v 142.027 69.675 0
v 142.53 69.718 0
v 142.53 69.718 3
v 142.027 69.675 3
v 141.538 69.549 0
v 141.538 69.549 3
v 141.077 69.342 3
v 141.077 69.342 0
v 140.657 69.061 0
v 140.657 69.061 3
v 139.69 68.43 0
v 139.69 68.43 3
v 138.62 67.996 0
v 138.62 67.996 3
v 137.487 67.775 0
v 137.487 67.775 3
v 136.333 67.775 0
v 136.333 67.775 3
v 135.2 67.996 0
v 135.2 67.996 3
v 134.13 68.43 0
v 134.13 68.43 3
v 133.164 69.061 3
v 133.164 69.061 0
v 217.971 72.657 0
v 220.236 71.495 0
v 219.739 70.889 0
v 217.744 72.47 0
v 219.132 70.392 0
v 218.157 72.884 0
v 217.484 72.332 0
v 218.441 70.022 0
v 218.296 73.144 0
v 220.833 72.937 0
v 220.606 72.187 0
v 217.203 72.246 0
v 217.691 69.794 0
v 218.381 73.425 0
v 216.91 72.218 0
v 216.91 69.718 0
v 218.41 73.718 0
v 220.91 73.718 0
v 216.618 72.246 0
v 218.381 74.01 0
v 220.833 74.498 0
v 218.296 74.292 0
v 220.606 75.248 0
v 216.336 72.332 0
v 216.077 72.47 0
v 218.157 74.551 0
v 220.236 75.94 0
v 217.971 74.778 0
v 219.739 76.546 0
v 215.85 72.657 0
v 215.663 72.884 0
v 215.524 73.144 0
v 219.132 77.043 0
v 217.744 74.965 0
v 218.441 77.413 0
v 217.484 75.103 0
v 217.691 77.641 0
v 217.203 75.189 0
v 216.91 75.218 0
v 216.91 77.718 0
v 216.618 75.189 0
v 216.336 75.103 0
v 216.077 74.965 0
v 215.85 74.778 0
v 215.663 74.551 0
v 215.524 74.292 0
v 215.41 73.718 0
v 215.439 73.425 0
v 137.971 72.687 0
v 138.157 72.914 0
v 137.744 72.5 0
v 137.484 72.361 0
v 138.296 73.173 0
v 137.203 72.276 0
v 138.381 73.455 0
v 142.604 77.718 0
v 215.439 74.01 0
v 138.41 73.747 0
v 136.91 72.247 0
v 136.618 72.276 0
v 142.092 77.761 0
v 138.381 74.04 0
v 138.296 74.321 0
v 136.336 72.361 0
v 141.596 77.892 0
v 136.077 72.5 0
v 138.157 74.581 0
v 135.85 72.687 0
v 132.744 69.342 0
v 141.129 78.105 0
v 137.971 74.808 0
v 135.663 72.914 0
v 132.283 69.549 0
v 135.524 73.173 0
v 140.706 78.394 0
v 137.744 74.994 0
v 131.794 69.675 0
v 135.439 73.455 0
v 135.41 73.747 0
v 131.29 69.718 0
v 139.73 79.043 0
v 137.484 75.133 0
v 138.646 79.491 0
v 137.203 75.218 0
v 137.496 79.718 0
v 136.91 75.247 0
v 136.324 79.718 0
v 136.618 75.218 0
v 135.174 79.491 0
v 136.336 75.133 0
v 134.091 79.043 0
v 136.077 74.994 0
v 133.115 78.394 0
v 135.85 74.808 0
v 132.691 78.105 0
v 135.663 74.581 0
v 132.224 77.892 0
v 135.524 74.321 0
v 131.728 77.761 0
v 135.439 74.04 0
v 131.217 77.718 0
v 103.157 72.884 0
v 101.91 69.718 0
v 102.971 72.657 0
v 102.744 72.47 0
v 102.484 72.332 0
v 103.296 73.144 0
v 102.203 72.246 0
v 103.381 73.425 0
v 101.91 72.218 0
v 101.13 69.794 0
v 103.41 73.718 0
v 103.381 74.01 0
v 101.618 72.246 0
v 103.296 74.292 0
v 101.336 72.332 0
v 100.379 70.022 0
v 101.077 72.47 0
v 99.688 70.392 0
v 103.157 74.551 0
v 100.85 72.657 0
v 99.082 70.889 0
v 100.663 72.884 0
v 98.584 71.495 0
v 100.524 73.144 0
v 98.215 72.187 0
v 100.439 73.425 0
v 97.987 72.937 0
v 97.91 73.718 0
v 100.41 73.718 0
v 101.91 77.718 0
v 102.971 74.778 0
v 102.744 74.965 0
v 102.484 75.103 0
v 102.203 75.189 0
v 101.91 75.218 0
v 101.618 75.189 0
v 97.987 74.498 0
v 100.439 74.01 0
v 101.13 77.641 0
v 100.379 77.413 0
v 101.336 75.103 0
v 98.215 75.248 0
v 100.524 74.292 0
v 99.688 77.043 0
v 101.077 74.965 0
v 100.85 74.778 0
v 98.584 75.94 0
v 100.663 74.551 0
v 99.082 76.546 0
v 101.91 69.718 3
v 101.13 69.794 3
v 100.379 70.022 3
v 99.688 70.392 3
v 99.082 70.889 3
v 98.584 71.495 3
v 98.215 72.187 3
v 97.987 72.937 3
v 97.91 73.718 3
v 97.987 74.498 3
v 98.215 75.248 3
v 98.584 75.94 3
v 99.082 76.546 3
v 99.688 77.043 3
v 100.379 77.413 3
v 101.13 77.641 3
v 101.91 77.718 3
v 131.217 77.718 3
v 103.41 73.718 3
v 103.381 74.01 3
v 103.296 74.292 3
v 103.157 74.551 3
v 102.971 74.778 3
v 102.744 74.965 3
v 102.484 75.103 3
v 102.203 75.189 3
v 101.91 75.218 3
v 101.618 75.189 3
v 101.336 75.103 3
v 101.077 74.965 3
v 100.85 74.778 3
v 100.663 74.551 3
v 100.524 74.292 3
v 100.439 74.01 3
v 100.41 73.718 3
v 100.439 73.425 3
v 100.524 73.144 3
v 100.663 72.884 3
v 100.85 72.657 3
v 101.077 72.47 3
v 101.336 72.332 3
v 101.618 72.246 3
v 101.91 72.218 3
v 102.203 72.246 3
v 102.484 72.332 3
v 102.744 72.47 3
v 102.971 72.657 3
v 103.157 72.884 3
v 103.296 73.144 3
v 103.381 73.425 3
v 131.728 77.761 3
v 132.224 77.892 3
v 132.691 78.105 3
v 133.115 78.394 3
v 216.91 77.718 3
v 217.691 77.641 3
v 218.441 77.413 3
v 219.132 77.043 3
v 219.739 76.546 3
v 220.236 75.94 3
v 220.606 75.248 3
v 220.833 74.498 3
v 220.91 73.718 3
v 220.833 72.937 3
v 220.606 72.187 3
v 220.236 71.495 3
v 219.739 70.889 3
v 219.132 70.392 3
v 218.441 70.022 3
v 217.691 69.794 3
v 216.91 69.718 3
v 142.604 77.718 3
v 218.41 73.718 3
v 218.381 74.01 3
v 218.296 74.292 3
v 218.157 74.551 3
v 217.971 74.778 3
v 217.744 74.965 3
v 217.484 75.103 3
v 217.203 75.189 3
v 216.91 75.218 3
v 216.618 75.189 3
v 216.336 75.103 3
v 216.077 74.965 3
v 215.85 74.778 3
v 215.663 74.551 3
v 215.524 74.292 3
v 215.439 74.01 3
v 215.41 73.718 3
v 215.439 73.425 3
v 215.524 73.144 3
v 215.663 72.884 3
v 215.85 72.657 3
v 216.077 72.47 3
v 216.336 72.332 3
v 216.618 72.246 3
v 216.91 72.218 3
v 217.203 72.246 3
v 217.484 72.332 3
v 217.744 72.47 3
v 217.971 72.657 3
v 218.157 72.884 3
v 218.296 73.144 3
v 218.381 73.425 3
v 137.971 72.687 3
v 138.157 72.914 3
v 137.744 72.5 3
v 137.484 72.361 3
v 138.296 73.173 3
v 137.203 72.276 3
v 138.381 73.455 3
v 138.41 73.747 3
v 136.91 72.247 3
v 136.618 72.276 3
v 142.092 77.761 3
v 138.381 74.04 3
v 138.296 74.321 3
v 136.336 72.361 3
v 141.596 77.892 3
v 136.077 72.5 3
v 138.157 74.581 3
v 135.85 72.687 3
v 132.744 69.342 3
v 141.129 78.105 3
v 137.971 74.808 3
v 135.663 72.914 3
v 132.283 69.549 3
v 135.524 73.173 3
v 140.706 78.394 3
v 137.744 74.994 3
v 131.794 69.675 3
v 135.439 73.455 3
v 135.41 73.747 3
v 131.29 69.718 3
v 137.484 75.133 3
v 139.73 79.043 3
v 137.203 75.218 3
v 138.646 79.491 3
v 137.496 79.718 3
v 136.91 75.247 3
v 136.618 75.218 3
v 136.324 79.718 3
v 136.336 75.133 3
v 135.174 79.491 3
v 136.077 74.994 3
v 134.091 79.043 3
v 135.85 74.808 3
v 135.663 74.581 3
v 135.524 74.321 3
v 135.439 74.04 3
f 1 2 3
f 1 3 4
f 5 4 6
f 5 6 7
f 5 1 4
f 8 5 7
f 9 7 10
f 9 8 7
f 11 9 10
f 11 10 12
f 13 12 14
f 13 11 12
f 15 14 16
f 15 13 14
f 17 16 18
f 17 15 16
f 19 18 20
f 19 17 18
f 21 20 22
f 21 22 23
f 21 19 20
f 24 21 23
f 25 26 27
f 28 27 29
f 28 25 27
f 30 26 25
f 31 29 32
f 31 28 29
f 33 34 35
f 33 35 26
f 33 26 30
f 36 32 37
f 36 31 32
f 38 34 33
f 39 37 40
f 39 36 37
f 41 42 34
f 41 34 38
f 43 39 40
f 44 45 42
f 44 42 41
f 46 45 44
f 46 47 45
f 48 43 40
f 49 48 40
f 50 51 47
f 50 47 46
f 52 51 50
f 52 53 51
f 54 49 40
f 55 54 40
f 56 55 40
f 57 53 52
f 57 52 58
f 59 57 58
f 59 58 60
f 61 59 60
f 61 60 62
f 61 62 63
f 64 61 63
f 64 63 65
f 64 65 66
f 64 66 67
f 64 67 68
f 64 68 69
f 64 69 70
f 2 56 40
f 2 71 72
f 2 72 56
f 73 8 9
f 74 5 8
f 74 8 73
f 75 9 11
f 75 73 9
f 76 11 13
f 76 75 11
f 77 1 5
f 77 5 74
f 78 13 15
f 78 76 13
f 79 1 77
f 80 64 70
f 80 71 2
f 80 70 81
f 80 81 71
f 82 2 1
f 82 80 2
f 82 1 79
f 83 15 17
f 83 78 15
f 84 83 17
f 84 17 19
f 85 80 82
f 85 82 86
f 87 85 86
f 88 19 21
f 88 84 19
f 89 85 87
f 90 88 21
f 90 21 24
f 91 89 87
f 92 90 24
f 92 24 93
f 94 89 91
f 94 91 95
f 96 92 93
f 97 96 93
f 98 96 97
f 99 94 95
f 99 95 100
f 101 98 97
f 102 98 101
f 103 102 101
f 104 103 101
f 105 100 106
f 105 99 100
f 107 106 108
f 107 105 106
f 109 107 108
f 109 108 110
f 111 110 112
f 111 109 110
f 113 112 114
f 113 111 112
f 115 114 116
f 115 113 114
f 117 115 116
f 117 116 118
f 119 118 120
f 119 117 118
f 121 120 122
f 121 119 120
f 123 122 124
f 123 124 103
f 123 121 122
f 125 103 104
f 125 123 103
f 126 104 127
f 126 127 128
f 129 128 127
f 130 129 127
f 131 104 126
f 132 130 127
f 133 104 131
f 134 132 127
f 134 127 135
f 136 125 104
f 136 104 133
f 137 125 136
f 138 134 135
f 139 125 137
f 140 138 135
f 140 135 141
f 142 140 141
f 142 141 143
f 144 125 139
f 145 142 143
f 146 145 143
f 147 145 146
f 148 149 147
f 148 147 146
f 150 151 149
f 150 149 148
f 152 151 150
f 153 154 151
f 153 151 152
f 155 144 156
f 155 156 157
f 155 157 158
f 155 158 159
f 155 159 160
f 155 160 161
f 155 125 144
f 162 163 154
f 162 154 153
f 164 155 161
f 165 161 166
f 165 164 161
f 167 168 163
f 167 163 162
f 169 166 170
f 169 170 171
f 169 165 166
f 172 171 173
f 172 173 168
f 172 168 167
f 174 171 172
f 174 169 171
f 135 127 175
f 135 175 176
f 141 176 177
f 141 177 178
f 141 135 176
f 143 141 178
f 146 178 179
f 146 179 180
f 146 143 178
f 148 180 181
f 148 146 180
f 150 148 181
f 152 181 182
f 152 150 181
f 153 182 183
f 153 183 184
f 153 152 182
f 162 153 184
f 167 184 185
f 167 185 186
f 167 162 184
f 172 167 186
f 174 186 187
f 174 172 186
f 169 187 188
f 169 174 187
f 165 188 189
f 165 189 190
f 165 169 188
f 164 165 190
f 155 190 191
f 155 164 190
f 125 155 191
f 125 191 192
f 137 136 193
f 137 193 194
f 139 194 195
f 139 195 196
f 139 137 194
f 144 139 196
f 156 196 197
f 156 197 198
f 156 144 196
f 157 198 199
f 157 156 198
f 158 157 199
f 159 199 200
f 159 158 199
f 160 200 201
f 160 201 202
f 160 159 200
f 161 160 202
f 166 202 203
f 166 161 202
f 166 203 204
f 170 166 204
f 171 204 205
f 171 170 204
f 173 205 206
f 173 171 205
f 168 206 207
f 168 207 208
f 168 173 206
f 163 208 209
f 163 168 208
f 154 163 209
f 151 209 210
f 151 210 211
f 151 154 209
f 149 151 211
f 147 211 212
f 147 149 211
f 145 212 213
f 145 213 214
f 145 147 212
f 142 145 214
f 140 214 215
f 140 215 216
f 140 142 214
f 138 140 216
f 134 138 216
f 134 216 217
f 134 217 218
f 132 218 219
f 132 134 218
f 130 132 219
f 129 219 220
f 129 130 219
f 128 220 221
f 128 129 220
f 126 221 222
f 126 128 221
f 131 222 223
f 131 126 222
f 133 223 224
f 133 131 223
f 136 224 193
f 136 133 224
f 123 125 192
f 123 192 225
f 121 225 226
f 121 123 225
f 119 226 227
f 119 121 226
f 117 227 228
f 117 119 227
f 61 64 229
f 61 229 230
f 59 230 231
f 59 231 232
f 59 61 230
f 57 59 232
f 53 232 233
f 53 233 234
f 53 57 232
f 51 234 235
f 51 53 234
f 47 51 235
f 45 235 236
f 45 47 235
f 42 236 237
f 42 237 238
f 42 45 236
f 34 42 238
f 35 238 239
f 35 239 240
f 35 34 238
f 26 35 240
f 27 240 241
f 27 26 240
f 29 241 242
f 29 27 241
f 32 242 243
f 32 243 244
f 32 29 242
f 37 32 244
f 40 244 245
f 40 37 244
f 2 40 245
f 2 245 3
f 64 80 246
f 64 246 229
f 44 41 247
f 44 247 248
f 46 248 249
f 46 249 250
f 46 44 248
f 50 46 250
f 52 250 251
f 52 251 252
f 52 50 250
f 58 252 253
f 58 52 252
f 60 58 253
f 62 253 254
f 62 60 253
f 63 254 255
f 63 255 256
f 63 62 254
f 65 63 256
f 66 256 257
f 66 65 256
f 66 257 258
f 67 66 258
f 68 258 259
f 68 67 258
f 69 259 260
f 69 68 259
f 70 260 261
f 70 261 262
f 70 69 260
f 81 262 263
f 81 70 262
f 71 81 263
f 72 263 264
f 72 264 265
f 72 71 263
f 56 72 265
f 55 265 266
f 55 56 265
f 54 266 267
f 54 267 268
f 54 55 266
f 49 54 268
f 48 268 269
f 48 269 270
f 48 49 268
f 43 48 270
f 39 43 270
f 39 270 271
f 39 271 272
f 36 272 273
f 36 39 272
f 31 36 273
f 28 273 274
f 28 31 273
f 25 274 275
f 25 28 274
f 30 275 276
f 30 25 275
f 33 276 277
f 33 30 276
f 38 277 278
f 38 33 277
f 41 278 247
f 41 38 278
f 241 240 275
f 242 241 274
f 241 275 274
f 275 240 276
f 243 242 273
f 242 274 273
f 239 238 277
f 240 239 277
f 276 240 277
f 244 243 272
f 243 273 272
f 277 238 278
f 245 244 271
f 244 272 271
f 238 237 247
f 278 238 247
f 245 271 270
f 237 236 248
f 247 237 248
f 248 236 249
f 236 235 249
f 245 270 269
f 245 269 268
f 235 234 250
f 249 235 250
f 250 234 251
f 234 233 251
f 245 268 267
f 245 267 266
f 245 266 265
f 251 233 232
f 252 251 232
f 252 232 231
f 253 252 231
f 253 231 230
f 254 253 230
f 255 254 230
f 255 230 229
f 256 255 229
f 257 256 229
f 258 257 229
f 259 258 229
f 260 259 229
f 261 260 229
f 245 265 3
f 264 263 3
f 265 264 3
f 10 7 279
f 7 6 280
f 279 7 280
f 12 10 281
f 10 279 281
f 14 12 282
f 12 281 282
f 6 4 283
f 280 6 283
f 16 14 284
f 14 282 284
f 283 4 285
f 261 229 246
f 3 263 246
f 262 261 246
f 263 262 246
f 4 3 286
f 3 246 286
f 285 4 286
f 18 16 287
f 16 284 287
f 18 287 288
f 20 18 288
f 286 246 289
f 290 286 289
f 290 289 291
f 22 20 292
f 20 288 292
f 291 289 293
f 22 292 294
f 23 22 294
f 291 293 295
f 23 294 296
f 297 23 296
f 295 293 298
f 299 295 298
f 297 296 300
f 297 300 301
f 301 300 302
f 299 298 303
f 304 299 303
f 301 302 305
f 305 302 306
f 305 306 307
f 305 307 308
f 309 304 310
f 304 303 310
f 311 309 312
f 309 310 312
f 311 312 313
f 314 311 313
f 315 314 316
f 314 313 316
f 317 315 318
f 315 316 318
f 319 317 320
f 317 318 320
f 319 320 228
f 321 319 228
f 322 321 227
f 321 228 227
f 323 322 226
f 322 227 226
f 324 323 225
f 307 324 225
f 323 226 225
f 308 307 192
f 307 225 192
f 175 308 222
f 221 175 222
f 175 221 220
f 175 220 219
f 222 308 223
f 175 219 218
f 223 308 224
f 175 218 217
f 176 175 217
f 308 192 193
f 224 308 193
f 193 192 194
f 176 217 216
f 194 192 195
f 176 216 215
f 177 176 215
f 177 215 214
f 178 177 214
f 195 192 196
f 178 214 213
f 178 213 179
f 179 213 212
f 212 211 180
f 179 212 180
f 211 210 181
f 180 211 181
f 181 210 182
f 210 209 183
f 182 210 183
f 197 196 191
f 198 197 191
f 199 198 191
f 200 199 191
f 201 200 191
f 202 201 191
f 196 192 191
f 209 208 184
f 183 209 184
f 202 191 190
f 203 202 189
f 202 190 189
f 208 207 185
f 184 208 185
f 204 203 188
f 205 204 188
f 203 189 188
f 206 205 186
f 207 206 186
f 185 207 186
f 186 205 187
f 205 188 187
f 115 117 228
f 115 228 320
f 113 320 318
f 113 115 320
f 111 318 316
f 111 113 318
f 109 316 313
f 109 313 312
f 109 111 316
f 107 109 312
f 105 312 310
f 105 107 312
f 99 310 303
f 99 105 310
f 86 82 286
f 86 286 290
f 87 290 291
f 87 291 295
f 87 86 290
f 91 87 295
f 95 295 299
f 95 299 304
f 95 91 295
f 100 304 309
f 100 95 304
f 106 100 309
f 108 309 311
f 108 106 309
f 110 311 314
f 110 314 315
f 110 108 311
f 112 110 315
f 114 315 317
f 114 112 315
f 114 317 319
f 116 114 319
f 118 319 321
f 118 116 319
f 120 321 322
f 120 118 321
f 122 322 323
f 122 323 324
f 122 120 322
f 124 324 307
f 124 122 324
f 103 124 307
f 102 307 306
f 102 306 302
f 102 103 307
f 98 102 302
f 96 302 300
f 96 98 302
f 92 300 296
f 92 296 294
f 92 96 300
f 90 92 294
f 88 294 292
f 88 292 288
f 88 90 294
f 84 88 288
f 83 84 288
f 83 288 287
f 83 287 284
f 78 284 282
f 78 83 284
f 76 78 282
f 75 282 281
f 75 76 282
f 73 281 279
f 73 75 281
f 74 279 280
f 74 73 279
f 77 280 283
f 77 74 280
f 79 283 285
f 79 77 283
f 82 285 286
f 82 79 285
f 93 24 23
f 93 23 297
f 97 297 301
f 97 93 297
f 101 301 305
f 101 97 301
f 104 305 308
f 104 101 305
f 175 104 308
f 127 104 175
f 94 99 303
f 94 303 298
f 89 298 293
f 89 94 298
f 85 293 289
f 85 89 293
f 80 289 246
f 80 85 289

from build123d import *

# Parameters (mm, degrees)
ESQUISSE15_R        = 1.5
BOSS_EXTRU_15_DEPTH = 3


with BuildPart() as part:
    # Esquisse15 → Boss.-Extru.15 (new body)
    with BuildSketch(Plane.XY):
        with BuildLine():
            Line((101.910180697, 77.71752531), (131.216827386, 77.71752531))
            ThreePointArc((131.216827386, 77.71752531), (132.224213524, 77.891720439), (133.114611823, 78.394076531))
            ThreePointArc((133.114611823, 78.394076531), (136.910180697, 79.747178972), (140.705749571, 78.394076531))
            ThreePointArc((140.705749571, 78.394076531), (141.59614787, 77.891720439), (142.603534008, 77.71752531))
            Line((142.603534008, 77.71752531), (216.910180697, 77.71752531))
            ThreePointArc((216.910180697, 77.71752531), (220.910180697, 73.71752531), (216.910180697, 69.71752531))
            Line((216.910180697, 69.71752531), (142.530142387, 69.71752531))
            ThreePointArc((142.530142387, 69.71752531), (141.537583488, 69.54857226), (140.656821824, 69.060743198))
            ThreePointArc((140.656821824, 69.060743198), (136.910180697, 67.747178972), (133.16353957, 69.060743198))
            ThreePointArc((133.16353957, 69.060743198), (132.282777907, 69.54857226), (131.290219007, 69.71752531))
            Line((131.290219007, 69.71752531), (101.910180697, 69.71752531))
            ThreePointArc((101.910180697, 69.71752531), (97.910180697, 73.71752531), (101.910180697, 77.71752531))
        make_face()
        with Locations((101.910180697, 73.71752531)):
            Circle(ESQUISSE15_R, mode=Mode.SUBTRACT)
        with Locations((216.910180697, 73.71752531)):
            Circle(ESQUISSE15_R, mode=Mode.SUBTRACT)
        with Locations((136.910180697, 73.747178972)):
            Circle(ESQUISSE15_R, mode=Mode.SUBTRACT)
    extrude(amount=BOSS_EXTRU_15_DEPTH)


solid = part.part
